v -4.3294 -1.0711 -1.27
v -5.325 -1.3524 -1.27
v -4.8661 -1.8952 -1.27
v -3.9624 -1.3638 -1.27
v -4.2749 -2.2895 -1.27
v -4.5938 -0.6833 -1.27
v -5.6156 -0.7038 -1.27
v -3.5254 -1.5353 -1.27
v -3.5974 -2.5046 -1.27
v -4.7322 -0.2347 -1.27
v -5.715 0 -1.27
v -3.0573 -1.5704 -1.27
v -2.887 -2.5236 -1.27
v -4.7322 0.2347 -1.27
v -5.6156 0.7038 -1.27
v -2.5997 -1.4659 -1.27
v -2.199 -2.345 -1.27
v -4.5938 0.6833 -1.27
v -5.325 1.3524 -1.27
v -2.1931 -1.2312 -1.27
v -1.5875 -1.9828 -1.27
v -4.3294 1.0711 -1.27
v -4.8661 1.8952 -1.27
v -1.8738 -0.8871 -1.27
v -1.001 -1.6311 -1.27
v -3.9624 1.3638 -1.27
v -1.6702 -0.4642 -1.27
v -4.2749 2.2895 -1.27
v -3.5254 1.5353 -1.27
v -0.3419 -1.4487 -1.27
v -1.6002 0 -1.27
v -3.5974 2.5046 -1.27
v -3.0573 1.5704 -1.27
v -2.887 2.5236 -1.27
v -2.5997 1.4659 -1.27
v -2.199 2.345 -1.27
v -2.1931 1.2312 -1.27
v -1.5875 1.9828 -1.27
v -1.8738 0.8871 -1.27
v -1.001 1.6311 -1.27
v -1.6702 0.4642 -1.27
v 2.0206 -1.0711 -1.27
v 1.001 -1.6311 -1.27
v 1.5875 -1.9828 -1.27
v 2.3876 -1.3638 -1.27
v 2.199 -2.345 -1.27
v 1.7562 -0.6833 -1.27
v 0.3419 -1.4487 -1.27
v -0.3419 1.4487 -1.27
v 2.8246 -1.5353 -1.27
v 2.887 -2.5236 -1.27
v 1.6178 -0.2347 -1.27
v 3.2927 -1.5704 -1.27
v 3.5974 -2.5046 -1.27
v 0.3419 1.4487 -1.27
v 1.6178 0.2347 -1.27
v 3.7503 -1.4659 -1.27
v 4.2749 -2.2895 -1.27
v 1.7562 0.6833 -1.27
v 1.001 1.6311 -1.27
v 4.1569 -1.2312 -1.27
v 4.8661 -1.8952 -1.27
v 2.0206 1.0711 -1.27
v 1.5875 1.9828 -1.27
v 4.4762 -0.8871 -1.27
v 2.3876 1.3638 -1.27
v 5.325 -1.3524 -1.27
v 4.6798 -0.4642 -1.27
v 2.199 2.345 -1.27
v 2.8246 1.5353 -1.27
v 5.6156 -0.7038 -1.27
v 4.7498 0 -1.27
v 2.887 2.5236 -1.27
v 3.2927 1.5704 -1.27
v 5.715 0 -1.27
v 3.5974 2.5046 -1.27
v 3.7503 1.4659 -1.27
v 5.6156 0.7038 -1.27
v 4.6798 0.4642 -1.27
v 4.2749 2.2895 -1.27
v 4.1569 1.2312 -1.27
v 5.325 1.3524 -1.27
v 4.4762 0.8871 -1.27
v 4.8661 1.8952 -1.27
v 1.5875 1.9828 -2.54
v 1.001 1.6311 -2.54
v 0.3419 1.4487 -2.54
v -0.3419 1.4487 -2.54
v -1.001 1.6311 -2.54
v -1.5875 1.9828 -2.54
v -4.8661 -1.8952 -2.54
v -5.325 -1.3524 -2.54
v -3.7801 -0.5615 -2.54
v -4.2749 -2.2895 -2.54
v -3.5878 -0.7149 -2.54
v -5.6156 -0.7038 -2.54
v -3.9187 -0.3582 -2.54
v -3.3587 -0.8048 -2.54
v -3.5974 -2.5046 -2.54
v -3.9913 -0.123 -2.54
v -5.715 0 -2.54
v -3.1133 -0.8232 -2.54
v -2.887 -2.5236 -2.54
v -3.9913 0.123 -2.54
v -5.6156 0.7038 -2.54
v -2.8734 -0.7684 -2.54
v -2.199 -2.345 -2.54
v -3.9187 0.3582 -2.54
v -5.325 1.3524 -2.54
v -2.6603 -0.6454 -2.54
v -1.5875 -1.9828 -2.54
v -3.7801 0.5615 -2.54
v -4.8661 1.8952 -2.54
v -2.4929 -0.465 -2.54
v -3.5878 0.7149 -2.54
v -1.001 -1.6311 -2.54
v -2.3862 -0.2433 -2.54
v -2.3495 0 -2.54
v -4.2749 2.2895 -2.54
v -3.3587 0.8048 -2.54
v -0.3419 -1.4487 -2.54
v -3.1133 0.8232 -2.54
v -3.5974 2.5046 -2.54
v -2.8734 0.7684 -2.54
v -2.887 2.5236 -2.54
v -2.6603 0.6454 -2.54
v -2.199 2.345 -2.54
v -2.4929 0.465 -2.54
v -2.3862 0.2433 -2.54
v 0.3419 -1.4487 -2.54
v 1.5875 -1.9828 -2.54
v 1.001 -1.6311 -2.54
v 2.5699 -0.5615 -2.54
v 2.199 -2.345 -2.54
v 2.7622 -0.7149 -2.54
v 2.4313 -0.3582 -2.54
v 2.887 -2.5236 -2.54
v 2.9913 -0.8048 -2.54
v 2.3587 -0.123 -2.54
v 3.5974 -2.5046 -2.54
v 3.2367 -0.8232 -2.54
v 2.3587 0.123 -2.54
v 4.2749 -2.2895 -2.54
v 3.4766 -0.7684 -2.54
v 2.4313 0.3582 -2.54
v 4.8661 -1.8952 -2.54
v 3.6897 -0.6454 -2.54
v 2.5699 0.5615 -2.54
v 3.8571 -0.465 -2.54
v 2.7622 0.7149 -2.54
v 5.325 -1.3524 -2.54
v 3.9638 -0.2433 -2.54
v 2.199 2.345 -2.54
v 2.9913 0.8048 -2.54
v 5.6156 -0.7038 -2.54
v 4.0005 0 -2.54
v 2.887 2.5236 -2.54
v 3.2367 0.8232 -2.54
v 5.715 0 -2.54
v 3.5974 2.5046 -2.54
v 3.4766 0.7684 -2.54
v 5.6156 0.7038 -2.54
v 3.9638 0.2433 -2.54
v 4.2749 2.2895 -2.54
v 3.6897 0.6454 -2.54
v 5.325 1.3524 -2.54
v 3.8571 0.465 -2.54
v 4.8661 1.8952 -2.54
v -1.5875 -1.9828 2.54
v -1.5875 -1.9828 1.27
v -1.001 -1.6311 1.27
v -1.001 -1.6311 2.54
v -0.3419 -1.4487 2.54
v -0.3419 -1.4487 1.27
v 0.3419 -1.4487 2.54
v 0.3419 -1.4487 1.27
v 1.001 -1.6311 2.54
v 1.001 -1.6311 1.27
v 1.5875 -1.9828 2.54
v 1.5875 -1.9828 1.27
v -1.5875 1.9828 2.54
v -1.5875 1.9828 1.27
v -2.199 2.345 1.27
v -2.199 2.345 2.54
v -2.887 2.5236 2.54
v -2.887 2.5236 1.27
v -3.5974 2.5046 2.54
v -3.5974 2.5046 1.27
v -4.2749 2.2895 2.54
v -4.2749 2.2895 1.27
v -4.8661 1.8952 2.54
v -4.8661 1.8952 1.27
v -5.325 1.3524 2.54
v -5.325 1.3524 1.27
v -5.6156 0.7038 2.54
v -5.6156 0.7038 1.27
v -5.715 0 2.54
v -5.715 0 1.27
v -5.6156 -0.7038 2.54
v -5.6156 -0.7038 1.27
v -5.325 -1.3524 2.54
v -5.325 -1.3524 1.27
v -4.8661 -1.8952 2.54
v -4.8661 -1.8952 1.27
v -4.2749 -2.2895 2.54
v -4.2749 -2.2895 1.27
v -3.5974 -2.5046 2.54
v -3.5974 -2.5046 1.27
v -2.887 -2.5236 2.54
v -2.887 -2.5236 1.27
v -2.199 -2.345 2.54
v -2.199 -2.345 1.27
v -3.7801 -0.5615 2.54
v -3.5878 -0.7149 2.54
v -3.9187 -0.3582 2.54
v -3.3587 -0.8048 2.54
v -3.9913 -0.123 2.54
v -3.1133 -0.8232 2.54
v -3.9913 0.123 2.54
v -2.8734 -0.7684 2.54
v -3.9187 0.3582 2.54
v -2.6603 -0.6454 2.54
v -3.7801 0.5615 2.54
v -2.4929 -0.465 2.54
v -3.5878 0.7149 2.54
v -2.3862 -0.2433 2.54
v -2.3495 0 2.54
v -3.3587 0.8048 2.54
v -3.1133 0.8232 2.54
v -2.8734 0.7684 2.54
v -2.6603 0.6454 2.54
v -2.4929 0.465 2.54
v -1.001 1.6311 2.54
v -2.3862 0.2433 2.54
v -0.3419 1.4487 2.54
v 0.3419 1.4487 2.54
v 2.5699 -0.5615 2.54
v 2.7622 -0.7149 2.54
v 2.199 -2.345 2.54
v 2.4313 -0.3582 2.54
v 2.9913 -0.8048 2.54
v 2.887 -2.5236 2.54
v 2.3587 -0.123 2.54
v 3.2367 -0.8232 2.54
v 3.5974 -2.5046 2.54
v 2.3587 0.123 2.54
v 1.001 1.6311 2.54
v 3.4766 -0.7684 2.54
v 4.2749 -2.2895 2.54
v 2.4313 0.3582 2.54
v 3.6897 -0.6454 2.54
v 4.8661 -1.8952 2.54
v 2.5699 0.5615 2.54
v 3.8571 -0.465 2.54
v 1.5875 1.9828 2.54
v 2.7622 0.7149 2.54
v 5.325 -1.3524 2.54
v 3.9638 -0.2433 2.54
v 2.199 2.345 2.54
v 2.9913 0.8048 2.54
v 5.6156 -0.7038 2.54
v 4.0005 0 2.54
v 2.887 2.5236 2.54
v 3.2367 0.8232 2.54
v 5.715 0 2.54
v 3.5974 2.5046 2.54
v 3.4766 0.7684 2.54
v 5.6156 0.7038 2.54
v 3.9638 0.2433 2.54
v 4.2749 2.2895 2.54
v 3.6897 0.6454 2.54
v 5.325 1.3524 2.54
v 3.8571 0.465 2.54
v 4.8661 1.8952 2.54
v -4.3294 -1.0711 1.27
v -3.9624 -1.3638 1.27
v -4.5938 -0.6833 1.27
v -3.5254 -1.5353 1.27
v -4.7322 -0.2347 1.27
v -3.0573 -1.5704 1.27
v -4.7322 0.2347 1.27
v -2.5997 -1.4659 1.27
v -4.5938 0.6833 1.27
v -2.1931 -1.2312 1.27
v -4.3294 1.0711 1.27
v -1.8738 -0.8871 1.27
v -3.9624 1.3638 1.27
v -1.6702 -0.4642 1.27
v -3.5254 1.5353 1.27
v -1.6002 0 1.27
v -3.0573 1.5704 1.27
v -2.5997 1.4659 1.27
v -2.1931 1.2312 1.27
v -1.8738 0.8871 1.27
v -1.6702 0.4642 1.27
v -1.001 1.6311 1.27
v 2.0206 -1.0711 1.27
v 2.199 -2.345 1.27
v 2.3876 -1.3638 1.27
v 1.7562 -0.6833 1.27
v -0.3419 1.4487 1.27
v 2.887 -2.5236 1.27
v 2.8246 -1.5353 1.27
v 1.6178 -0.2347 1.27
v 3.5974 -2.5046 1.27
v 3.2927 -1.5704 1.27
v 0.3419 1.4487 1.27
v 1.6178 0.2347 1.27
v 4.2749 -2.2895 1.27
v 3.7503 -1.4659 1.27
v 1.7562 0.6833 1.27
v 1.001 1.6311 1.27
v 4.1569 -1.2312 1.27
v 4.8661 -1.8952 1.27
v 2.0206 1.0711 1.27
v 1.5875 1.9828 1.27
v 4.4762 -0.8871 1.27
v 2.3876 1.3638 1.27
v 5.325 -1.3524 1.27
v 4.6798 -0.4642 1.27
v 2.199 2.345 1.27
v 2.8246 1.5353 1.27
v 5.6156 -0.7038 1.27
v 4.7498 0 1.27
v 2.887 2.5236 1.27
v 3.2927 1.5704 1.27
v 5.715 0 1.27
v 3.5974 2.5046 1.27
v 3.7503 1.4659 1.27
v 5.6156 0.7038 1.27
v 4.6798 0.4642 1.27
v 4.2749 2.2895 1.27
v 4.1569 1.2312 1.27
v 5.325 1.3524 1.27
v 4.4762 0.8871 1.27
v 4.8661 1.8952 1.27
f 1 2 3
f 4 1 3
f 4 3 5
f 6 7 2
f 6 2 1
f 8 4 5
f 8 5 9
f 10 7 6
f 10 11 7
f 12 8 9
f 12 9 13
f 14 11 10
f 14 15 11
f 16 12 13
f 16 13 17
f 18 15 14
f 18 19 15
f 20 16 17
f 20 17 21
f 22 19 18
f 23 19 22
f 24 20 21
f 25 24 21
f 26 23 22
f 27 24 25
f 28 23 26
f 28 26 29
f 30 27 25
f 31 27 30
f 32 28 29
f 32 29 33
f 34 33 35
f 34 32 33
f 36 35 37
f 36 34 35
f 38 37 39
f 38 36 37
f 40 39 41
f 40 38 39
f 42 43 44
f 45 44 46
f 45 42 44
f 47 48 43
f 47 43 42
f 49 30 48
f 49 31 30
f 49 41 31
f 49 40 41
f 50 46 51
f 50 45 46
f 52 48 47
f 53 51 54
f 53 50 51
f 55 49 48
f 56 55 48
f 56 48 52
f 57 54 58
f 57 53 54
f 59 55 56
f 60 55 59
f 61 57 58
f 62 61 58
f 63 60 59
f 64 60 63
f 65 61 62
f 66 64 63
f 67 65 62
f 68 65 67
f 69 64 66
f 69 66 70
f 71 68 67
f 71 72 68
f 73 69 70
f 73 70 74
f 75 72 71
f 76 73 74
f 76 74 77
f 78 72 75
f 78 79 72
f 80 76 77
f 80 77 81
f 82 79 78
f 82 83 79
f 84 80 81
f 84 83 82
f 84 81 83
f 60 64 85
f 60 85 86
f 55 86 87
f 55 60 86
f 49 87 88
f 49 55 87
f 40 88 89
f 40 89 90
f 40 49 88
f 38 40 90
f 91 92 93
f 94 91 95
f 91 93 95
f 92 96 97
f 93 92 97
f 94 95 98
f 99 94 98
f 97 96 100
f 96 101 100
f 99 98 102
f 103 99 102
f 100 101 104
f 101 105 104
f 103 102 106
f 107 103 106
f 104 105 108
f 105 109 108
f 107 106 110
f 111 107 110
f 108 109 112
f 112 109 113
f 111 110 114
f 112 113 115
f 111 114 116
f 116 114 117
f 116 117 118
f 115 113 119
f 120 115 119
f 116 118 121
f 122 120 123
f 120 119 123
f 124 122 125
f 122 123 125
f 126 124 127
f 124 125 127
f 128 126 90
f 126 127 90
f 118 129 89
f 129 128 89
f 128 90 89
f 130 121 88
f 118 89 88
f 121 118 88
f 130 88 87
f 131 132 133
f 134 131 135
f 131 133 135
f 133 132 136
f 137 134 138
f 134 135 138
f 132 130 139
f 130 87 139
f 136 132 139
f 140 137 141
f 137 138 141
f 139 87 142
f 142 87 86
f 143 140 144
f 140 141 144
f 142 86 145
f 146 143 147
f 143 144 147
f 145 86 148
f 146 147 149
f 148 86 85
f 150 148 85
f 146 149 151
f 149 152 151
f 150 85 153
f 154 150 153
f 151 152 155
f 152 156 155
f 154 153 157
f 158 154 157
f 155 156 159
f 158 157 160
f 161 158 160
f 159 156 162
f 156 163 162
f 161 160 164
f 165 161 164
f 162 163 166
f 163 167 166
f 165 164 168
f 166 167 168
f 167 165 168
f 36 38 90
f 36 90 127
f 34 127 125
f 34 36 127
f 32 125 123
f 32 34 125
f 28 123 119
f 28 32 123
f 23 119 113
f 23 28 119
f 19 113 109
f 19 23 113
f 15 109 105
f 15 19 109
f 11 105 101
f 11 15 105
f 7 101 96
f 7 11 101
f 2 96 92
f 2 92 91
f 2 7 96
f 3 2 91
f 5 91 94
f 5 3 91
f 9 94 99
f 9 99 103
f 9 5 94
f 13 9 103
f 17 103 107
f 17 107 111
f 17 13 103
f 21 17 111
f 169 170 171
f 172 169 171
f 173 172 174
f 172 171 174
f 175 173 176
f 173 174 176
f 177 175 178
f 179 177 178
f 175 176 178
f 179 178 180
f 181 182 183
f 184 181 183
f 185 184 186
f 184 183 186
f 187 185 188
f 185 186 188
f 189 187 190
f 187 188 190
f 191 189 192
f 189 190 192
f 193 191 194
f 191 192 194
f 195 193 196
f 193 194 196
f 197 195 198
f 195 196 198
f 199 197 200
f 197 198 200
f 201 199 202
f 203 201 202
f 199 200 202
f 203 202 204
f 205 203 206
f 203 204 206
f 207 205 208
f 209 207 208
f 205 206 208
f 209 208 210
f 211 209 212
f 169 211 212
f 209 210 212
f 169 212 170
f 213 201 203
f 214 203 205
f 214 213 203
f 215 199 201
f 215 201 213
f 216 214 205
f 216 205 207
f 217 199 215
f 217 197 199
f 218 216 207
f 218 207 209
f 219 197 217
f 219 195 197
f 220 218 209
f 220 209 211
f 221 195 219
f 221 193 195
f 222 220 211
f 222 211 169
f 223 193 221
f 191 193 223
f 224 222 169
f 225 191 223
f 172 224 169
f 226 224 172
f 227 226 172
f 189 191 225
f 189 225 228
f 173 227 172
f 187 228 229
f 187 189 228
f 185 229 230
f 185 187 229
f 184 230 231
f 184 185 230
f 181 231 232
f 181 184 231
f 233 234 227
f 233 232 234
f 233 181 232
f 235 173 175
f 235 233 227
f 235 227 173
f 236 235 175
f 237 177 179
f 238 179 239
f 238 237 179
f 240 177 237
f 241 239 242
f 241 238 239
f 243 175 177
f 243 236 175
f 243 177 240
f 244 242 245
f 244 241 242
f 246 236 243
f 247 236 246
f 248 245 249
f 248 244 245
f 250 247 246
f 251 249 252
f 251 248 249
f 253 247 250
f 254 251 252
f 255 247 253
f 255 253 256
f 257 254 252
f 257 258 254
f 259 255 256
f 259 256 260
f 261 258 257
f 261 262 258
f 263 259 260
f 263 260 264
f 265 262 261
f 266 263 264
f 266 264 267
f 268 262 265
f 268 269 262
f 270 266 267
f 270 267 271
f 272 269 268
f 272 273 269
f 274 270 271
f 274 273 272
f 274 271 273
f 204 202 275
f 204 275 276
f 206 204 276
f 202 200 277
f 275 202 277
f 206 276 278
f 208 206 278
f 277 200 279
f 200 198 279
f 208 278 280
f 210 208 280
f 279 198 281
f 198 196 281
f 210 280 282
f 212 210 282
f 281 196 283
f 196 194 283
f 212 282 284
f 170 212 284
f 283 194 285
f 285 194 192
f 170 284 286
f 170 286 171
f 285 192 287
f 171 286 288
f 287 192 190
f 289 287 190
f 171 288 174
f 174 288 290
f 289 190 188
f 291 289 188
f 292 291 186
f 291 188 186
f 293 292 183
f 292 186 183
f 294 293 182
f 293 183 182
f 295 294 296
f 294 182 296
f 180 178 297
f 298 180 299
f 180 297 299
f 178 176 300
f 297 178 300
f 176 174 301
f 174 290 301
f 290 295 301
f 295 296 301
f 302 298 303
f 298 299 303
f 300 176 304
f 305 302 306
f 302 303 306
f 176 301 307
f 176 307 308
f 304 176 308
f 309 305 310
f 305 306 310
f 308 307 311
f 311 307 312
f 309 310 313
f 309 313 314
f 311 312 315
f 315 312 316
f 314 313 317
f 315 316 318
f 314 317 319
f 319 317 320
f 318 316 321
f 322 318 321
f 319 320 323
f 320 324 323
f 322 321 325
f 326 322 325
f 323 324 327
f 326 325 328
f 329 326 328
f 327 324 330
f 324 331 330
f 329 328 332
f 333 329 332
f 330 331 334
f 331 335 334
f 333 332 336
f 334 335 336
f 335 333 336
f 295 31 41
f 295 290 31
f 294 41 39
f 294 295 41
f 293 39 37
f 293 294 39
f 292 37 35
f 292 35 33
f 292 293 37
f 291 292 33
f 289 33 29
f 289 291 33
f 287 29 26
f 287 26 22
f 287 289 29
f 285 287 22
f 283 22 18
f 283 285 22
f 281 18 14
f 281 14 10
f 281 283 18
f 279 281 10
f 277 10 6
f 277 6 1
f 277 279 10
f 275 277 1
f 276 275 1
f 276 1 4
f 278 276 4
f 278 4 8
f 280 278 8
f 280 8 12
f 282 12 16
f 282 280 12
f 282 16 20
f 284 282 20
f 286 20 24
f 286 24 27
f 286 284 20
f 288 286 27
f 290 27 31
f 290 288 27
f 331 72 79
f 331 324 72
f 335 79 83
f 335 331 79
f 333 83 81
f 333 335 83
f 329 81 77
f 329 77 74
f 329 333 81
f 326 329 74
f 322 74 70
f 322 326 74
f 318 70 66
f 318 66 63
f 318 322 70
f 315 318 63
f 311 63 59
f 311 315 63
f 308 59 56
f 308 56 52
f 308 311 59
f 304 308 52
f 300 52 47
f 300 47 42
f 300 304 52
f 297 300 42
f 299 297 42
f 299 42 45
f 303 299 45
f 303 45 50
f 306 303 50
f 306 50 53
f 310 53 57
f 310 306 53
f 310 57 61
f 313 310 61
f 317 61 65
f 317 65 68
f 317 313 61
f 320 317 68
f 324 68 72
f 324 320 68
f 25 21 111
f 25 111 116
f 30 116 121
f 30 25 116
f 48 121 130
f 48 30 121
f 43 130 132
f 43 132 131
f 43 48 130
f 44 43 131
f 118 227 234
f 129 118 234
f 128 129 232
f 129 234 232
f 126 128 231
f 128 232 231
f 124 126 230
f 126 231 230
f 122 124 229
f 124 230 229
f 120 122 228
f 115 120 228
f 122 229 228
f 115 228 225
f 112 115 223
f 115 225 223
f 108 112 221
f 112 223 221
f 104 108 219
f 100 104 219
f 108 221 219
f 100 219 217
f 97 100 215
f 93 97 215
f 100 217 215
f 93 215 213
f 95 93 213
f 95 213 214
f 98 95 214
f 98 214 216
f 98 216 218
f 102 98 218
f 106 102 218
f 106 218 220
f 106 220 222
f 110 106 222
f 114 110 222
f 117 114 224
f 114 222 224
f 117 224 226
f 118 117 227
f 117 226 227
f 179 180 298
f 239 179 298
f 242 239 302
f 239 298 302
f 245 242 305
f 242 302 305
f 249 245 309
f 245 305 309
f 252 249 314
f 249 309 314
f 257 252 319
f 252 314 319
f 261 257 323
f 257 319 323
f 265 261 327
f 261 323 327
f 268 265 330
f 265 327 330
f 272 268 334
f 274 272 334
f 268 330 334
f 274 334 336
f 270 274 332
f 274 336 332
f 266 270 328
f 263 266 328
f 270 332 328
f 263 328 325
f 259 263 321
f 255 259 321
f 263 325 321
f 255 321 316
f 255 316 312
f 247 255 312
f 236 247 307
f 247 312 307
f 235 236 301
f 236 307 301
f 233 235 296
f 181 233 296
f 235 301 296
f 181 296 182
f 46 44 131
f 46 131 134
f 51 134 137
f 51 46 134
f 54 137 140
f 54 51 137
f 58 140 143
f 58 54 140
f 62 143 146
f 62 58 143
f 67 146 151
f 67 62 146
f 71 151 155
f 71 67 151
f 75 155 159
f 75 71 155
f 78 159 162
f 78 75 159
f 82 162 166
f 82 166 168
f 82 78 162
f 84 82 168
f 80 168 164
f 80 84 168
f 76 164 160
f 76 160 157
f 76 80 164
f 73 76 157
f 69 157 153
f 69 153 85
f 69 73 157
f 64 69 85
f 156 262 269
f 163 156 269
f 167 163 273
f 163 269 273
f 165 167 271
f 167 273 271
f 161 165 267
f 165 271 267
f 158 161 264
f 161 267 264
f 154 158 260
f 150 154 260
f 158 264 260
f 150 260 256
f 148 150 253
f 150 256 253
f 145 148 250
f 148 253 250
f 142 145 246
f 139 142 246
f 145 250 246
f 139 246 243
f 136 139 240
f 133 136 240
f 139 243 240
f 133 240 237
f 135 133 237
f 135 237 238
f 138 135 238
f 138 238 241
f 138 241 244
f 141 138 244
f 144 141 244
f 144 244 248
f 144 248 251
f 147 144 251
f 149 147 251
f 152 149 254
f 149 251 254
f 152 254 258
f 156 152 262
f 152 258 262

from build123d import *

# Parameters (mm, degrees)
SKETCH1_R             = 1.5748
BOSS_EXTRUDE1_DEPTH   = 1.27
BOSS_EXTRUDE1_2_DEPTH = 1.27
BOSS_EXTRUDE2_DEPTH   = 1.27
SKETCH3_R             = 0.8255
CUT_EXTRUDE1_DEPTH    = 5.08


with BuildPart() as part:
    # Sketch1 → Boss-Extrude1 (new, symmetric)
    with BuildSketch(Plane.XY):
        with Locations((3.175, 0)):
            Circle(SKETCH1_R)
    extrude(amount=BOSS_EXTRUDE1_DEPTH, both=True)



with BuildPart() as body_2:
    # Sketch1 → Boss-Extrude1 2 (new, symmetric)
    with BuildSketch(Plane.XY):
        with Locations((-3.175, 0)):
            Circle(SKETCH1_R)
    extrude(amount=BOSS_EXTRUDE1_2_DEPTH, both=True)


with BuildPart() as part_1:
    add(part.part)

    add(body_2.part)  # Boss-Extrude2 merges body 2
    # Sketch2 → Boss-Extrude2 (add)
    with BuildSketch(Plane.XY.offset(1.27)):
        with BuildLine():
            ThreePointArc((1.5875, -1.982786864), (5.715, 0), (1.5875, 1.982786864))
            ThreePointArc((1.5875, 1.982786864), (0, 1.425573729), (-1.5875, 1.982786864))
            ThreePointArc((-1.5875, 1.982786864), (-5.715, 0), (-1.5875, -1.982786864))
            ThreePointArc((-1.5875, -1.982786864), (0, -1.425573729), (1.5875, -1.982786864))
        make_face()
    boss_extrude2 = extrude(amount=BOSS_EXTRUDE2_DEPTH)

    # Mirror1: Boss-Extrude2 across plane
    add(boss_extrude2.mirror(Plane.XY))

    # Sketch3 → Cut-Extrude1 (cut)
    with BuildSketch(Plane.XY.offset(2.54)):
        with Locations((3.175, 0)):
            Circle(SKETCH3_R)
        with Locations((-3.175, 0)):
            Circle(SKETCH3_R)
    extrude(amount=-CUT_EXTRUDE1_DEPTH, mode=Mode.SUBTRACT)


solid = part_1.part
